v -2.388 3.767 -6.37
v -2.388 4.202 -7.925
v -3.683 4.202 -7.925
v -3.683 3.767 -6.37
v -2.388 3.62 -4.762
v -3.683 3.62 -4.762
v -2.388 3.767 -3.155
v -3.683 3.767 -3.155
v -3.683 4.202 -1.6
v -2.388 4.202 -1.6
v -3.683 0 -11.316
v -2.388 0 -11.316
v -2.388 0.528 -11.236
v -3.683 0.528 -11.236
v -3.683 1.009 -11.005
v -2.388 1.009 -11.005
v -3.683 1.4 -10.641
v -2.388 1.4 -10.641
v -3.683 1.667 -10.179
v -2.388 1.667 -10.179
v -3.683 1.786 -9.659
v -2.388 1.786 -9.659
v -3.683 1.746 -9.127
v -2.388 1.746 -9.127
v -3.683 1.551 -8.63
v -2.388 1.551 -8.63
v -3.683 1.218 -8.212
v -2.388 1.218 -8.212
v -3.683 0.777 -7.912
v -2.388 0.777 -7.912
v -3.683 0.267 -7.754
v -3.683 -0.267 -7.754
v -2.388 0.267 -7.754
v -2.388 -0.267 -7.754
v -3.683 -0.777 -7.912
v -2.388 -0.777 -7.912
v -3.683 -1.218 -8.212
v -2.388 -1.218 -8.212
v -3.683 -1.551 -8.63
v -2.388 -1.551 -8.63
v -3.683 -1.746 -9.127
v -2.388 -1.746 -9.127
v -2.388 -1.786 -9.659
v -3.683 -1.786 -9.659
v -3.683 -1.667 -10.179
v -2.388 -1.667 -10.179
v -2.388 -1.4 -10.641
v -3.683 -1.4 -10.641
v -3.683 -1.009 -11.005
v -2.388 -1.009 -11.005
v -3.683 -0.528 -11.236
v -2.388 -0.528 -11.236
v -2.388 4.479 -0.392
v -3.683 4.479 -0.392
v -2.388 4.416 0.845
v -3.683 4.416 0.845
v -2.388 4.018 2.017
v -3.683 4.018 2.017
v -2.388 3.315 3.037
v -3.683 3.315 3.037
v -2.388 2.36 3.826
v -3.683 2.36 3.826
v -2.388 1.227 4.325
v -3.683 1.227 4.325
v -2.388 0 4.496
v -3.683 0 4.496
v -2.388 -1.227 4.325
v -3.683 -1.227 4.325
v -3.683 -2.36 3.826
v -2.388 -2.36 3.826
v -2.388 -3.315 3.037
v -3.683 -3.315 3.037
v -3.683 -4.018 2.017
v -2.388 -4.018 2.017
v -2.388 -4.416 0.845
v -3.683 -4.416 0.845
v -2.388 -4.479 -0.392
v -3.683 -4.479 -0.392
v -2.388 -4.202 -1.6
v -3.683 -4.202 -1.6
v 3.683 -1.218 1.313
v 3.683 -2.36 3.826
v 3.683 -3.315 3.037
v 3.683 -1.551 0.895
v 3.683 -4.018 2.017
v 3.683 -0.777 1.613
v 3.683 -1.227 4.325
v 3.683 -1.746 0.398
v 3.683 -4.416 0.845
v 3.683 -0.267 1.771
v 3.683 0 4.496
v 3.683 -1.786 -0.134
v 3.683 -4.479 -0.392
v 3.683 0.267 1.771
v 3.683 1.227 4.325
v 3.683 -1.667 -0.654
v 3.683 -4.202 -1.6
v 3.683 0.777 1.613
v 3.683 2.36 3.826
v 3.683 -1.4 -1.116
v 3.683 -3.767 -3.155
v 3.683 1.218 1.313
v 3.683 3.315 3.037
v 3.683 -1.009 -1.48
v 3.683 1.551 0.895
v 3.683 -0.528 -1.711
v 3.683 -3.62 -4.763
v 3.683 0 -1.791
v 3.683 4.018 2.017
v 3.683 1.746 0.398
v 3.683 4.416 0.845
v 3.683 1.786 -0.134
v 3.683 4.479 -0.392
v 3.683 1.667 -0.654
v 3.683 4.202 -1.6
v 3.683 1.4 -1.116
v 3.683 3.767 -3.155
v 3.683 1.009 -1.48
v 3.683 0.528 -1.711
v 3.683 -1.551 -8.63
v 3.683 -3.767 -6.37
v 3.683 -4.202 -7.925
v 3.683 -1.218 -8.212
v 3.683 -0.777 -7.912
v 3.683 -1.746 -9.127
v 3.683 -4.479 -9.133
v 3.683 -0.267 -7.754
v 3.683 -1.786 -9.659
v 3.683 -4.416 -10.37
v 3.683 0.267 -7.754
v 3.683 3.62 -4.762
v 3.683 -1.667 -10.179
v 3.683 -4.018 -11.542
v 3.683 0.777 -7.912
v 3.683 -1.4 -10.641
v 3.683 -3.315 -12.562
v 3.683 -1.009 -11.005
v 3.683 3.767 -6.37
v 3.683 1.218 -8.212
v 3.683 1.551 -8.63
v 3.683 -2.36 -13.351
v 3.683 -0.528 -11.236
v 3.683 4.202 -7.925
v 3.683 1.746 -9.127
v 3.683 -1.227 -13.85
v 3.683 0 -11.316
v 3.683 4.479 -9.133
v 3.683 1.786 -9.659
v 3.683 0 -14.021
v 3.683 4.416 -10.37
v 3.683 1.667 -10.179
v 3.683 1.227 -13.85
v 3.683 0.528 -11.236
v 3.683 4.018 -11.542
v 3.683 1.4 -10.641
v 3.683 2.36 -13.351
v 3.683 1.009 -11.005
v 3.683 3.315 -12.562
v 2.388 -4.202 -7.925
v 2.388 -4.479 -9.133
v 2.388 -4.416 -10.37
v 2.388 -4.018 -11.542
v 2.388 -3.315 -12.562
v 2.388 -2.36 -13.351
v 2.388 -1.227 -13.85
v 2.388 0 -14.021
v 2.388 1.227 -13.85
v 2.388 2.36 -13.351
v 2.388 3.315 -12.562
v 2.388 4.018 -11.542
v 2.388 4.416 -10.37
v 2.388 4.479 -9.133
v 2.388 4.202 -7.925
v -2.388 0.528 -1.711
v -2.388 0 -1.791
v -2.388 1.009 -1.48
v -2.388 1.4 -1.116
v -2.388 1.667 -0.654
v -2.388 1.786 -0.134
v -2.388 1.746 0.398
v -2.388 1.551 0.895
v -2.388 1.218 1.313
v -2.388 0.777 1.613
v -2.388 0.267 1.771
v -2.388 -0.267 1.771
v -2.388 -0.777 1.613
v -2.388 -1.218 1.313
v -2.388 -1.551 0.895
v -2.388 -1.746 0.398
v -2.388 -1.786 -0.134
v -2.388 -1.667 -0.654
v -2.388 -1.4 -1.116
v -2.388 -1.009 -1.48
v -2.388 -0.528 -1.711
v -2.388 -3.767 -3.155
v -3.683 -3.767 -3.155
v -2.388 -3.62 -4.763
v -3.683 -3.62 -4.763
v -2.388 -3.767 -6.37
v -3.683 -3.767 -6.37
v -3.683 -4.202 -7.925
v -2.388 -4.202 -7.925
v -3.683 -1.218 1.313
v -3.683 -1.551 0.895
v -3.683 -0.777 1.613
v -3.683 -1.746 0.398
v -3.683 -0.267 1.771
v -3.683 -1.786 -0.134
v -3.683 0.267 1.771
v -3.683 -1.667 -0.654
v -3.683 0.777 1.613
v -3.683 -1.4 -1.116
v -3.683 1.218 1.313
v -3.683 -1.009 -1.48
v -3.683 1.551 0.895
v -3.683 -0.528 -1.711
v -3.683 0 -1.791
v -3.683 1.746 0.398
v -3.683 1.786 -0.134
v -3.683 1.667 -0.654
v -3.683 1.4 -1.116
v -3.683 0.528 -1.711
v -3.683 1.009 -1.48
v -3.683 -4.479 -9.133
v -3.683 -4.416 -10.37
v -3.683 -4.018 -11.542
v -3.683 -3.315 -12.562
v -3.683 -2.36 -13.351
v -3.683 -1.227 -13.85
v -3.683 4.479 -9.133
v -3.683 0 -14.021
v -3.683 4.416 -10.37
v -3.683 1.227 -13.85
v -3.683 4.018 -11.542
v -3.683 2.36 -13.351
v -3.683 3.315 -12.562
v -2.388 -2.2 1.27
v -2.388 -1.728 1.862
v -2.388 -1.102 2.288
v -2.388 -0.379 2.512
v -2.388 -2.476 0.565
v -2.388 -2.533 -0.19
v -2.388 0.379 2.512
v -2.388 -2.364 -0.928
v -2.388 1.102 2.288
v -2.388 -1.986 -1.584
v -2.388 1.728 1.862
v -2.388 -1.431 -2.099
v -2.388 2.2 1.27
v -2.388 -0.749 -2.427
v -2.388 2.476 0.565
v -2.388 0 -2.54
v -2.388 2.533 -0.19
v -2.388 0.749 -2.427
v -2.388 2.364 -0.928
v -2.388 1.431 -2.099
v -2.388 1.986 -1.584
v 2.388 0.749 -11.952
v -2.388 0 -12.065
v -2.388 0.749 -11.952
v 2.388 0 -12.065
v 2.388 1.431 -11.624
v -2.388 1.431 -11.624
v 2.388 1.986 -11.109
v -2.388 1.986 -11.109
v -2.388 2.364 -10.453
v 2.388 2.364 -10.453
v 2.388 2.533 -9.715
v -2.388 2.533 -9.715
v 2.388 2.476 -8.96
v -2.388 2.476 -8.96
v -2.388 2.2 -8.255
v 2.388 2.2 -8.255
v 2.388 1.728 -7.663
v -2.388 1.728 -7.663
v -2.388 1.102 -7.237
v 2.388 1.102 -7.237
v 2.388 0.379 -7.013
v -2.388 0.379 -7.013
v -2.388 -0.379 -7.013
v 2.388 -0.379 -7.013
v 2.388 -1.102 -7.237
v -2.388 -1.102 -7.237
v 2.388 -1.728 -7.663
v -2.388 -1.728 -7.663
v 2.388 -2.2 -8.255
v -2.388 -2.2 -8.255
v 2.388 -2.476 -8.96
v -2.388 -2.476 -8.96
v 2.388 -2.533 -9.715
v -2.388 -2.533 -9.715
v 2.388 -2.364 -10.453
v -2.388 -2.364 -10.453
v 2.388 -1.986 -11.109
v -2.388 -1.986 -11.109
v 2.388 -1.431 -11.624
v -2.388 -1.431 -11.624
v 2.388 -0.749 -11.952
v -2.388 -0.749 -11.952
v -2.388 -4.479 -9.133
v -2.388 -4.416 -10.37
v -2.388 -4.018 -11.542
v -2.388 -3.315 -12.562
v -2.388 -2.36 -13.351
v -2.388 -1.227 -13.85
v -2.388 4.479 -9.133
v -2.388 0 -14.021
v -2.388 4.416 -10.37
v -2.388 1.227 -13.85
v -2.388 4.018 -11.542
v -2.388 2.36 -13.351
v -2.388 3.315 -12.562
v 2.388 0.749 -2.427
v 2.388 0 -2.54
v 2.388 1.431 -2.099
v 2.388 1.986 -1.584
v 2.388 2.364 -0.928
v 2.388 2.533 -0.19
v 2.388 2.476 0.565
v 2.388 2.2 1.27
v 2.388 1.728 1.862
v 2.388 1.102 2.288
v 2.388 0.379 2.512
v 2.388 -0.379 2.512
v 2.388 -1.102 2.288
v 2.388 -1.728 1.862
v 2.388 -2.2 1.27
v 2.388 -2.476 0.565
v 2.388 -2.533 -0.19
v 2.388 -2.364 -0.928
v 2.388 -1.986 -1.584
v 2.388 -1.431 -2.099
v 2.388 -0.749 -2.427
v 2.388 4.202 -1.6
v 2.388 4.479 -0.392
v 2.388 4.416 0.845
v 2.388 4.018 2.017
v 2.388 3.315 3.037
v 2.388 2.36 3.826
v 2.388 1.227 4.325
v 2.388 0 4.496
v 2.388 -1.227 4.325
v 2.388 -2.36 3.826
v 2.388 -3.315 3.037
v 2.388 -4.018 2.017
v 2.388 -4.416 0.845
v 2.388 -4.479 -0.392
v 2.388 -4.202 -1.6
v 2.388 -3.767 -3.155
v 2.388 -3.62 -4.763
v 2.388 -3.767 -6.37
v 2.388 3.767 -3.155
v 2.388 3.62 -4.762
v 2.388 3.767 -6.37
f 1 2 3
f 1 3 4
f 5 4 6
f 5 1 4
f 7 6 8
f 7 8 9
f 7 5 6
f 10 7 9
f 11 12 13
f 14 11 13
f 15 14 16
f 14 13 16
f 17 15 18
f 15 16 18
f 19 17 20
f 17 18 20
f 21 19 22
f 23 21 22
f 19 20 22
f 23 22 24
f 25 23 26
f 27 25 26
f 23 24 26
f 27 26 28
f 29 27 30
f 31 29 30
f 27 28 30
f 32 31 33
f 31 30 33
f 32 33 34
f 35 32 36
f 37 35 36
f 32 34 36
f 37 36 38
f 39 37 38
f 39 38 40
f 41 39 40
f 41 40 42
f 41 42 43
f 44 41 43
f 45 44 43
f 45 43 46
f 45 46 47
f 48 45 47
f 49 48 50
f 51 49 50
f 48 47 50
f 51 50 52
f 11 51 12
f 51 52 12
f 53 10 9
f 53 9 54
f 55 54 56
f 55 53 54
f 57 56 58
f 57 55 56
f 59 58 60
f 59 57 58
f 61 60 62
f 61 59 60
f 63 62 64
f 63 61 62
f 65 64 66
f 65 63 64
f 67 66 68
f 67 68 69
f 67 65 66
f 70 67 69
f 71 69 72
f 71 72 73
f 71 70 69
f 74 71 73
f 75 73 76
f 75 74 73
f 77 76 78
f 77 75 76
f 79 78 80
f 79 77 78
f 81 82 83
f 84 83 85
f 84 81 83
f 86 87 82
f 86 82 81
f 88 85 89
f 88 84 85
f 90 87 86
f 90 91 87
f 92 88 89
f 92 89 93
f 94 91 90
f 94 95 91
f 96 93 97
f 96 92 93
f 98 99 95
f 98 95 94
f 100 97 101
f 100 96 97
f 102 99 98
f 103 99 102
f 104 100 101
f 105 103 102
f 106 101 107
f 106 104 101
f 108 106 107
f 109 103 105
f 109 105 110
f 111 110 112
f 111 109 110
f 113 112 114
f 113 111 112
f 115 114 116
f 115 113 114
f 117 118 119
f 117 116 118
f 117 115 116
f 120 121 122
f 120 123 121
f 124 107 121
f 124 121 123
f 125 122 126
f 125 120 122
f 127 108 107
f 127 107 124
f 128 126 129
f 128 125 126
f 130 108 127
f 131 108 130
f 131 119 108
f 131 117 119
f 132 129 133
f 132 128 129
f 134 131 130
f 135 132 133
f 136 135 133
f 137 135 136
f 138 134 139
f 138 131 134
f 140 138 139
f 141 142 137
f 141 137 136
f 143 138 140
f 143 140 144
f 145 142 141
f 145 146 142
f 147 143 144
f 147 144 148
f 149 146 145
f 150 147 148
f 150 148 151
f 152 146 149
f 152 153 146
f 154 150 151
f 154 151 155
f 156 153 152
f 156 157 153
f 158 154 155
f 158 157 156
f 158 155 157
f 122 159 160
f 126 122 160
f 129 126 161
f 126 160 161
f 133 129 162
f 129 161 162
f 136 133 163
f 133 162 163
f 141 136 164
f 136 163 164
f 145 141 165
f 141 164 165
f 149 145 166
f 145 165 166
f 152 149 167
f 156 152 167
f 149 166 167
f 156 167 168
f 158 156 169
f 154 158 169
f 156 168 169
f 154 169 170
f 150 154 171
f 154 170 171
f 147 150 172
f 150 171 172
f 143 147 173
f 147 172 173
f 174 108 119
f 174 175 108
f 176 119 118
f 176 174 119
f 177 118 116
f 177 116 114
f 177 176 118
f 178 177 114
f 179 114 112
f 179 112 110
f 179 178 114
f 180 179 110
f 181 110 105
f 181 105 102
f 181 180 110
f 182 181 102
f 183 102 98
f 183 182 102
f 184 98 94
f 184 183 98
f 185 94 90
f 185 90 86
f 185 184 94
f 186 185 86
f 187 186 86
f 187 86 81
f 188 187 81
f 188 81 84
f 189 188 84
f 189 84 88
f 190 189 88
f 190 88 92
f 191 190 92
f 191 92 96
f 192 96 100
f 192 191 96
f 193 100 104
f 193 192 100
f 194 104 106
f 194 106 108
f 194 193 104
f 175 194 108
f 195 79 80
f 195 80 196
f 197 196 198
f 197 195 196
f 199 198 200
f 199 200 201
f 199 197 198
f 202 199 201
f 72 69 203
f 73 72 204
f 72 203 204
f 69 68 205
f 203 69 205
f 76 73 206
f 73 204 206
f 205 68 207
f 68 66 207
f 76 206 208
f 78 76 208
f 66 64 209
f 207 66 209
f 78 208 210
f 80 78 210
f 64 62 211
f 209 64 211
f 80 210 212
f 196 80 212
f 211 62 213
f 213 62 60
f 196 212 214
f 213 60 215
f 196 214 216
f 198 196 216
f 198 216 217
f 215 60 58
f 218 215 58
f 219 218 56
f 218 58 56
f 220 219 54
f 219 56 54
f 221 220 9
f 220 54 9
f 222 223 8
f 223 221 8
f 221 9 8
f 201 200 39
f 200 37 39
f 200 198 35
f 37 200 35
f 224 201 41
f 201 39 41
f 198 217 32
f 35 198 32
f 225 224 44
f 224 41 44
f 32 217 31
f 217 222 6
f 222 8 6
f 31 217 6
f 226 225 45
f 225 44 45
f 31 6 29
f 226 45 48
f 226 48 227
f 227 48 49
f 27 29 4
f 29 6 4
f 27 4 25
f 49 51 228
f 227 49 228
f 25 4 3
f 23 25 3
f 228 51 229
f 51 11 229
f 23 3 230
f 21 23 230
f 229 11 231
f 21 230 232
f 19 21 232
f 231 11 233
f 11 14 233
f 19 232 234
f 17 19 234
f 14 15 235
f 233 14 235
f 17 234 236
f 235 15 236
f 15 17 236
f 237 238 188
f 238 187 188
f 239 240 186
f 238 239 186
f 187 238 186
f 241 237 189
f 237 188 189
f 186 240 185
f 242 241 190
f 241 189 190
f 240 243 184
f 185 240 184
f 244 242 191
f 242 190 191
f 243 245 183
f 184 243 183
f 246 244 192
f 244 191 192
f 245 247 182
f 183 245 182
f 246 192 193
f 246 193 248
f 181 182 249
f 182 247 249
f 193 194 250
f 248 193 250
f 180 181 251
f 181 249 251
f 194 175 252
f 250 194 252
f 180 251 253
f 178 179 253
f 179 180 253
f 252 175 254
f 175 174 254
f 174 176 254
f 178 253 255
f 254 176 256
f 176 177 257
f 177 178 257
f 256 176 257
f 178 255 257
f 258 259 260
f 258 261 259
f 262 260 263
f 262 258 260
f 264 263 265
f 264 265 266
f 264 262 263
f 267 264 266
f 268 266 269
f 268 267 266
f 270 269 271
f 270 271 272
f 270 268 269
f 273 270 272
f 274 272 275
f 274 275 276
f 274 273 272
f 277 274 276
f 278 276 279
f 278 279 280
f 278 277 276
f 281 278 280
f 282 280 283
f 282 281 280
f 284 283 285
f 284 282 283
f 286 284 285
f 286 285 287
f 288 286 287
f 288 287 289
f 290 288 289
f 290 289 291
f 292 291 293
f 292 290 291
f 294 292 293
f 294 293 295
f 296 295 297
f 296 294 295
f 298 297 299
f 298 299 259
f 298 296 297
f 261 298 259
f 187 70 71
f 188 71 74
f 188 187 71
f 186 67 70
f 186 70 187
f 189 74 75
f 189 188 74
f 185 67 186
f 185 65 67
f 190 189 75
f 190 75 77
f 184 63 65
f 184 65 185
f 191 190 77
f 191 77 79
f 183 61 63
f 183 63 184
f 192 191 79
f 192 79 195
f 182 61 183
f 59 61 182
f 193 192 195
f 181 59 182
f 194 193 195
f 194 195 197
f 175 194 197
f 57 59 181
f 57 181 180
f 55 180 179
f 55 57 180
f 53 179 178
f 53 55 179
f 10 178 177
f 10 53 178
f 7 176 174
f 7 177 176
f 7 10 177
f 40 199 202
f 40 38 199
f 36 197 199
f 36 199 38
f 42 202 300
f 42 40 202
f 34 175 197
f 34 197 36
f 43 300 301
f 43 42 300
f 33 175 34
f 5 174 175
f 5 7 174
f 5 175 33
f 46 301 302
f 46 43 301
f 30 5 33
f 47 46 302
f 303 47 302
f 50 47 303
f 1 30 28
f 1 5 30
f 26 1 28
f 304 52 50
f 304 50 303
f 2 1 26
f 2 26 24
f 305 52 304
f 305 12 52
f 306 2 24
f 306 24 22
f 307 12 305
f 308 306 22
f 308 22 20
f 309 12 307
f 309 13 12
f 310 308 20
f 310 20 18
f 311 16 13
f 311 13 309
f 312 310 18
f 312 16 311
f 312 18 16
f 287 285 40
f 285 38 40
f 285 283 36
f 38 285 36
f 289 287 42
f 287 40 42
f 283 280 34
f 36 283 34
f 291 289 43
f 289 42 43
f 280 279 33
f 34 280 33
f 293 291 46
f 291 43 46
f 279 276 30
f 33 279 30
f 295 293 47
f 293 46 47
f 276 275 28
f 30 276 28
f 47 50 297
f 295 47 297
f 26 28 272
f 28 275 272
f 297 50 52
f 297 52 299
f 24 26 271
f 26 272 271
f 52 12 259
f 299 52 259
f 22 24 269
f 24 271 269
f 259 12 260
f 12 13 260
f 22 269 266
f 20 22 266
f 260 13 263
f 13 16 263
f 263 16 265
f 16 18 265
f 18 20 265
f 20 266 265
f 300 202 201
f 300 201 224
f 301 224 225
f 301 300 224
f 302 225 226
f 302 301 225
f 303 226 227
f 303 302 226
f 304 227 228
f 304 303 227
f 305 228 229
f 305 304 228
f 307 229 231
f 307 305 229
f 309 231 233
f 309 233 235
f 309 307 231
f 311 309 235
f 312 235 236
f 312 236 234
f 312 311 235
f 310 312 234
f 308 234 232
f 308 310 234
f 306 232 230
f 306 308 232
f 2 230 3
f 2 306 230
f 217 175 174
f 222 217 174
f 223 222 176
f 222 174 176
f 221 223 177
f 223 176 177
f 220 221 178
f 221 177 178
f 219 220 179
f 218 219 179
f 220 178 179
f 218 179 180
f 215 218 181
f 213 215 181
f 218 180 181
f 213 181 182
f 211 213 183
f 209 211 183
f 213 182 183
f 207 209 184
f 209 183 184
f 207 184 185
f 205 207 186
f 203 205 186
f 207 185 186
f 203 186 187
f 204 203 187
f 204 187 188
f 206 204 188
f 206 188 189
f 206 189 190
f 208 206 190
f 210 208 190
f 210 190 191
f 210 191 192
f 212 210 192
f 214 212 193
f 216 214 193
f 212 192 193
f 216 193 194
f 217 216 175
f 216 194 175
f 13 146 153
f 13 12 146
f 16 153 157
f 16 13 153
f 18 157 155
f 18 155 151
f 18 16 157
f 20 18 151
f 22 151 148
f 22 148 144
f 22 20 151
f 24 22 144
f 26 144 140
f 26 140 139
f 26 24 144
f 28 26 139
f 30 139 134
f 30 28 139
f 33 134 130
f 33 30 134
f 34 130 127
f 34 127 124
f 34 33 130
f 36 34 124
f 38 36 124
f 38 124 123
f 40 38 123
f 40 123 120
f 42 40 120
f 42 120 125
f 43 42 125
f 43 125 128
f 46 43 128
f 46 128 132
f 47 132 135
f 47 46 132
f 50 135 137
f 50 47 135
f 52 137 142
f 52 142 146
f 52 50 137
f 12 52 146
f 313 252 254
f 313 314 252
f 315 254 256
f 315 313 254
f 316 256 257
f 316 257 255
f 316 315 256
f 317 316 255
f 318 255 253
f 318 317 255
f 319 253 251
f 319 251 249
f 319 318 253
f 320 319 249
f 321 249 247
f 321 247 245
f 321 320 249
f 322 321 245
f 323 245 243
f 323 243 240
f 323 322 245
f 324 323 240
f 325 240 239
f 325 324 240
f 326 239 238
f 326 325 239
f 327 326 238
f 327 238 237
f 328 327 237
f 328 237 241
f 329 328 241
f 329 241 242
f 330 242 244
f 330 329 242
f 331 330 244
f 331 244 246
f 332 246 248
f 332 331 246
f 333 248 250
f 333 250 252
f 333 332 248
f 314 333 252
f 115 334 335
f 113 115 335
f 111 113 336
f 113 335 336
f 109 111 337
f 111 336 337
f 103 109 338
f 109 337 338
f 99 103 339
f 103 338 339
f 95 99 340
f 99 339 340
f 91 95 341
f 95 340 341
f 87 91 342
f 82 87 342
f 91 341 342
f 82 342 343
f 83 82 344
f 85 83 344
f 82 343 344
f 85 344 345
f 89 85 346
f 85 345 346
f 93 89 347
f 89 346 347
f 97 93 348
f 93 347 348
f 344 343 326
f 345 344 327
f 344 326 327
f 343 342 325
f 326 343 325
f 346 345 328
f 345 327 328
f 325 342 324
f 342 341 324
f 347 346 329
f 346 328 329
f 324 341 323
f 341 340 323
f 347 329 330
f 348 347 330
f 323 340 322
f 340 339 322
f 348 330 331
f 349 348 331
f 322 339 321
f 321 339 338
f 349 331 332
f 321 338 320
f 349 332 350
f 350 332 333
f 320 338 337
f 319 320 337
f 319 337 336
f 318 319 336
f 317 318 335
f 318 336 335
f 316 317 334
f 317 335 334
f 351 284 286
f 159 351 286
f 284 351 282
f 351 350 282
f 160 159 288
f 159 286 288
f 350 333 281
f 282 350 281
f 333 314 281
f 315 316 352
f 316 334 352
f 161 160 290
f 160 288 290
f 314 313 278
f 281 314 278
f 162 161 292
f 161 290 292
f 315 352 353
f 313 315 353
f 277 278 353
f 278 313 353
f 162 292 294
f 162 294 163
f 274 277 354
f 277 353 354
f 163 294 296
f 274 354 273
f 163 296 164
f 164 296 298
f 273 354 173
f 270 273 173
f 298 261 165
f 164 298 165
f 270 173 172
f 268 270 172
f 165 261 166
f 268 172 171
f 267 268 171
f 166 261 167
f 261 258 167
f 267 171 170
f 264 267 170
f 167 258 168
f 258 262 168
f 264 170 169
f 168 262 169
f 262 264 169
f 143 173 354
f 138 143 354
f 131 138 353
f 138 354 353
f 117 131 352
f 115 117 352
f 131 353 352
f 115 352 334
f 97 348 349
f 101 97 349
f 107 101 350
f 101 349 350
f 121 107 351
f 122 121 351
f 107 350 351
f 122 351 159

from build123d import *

# Parameters (mm, degrees)
SKETCH1_R             = 2.54
SKETCH1_R_2           = 1.7907
BOSS_EXTRUDE1_DEPTH   = 2.3876
BOSS_EXTRUDE1_2_DEPTH = 2.3876
BOSS_EXTRUDE2_START   = 2.3876
SKETCH1_4_R           = 1.7907
BOSS_EXTRUDE2_DEPTH   = 1.2954
BOSS_EXTRUDE3_START   = -2.3876
SKETCH1_5_R           = 1.7907
BOSS_EXTRUDE3_DEPTH   = 1.2954


with BuildPart() as part:
    # Sketch1 → Boss-Extrude1 (new, symmetric)
    with BuildSketch(Plane(origin=(0, 0, 0), x_dir=(0, 0, -1), z_dir=(1, 0, 0))):
        Circle(SKETCH1_R)
        Circle(SKETCH1_R_2, mode=Mode.SUBTRACT)
    extrude(amount=BOSS_EXTRUDE1_DEPTH, both=True)



with BuildPart() as body_2:
    # Sketch1 → Boss-Extrude1 2 (new, symmetric)
    with BuildSketch(Plane(origin=(0, 0, 0), x_dir=(0, 0, -1), z_dir=(1, 0, 0))):
        with Locations((9.525, 0)):
            Circle(SKETCH1_R)
        with Locations((9.525, 0)):
            Circle(SKETCH1_R_2, mode=Mode.SUBTRACT)
    extrude(amount=BOSS_EXTRUDE1_2_DEPTH, both=True)


with BuildPart() as part_1:
    add(part.part)

    add(body_2.part)  # Boss-Extrude2 merges body 2
    # Sketch1<4> → Boss-Extrude2 (add)
    with BuildSketch(Plane(origin=(0, 0, 0), x_dir=(0, 0, -1), z_dir=(1, 0, 0)).offset(BOSS_EXTRUDE2_START)):
        with BuildLine():
            ThreePointArc((7.925450664, 4.201625824), (4.7625, 3.619925475), (1.599549336, 4.201625824))
            ThreePointArc((1.599549336, 4.201625824), (-4.4958, 0), (1.599549336, -4.201625824))
            ThreePointArc((1.599549336, -4.201625824), (4.7625, -3.619925475), (7.925450664, -4.201625824))
            ThreePointArc((7.925450664, -4.201625824), (14.0208, 0), (7.925450664, 4.201625824))
        make_face()
        Circle(SKETCH1_4_R, mode=Mode.SUBTRACT)
        with Locations((9.525, 0)):
            Circle(SKETCH1_4_R, mode=Mode.SUBTRACT)
    extrude(amount=BOSS_EXTRUDE2_DEPTH)


with BuildPart() as body_2_2:
    # Sketch1<5> → Boss-Extrude3 (new body)
    with BuildSketch(Plane(origin=(0, 0, 0), x_dir=(0, 0, -1), z_dir=(1, 0, 0)).offset(BOSS_EXTRUDE3_START)):
        with BuildLine():
            ThreePointArc((1.599549336, 4.201625824), (-4.4958, 0), (1.599549336, -4.201625824))
            ThreePointArc((1.599549336, -4.201625824), (4.7625, -3.619925475), (7.925450664, -4.201625824))
            ThreePointArc((7.925450664, -4.201625824), (14.0208, 0), (7.925450664, 4.201625824))
            ThreePointArc((7.925450664, 4.201625824), (4.7625, 3.619925475), (1.599549336, 4.201625824))
        make_face()
        with Locations((9.525, 0)):
            Circle(SKETCH1_5_R, mode=Mode.SUBTRACT)
        Circle(SKETCH1_5_R, mode=Mode.SUBTRACT)
    extrude(amount=-BOSS_EXTRUDE3_DEPTH)


solid = Compound([part_1.part, body_2_2.part])
